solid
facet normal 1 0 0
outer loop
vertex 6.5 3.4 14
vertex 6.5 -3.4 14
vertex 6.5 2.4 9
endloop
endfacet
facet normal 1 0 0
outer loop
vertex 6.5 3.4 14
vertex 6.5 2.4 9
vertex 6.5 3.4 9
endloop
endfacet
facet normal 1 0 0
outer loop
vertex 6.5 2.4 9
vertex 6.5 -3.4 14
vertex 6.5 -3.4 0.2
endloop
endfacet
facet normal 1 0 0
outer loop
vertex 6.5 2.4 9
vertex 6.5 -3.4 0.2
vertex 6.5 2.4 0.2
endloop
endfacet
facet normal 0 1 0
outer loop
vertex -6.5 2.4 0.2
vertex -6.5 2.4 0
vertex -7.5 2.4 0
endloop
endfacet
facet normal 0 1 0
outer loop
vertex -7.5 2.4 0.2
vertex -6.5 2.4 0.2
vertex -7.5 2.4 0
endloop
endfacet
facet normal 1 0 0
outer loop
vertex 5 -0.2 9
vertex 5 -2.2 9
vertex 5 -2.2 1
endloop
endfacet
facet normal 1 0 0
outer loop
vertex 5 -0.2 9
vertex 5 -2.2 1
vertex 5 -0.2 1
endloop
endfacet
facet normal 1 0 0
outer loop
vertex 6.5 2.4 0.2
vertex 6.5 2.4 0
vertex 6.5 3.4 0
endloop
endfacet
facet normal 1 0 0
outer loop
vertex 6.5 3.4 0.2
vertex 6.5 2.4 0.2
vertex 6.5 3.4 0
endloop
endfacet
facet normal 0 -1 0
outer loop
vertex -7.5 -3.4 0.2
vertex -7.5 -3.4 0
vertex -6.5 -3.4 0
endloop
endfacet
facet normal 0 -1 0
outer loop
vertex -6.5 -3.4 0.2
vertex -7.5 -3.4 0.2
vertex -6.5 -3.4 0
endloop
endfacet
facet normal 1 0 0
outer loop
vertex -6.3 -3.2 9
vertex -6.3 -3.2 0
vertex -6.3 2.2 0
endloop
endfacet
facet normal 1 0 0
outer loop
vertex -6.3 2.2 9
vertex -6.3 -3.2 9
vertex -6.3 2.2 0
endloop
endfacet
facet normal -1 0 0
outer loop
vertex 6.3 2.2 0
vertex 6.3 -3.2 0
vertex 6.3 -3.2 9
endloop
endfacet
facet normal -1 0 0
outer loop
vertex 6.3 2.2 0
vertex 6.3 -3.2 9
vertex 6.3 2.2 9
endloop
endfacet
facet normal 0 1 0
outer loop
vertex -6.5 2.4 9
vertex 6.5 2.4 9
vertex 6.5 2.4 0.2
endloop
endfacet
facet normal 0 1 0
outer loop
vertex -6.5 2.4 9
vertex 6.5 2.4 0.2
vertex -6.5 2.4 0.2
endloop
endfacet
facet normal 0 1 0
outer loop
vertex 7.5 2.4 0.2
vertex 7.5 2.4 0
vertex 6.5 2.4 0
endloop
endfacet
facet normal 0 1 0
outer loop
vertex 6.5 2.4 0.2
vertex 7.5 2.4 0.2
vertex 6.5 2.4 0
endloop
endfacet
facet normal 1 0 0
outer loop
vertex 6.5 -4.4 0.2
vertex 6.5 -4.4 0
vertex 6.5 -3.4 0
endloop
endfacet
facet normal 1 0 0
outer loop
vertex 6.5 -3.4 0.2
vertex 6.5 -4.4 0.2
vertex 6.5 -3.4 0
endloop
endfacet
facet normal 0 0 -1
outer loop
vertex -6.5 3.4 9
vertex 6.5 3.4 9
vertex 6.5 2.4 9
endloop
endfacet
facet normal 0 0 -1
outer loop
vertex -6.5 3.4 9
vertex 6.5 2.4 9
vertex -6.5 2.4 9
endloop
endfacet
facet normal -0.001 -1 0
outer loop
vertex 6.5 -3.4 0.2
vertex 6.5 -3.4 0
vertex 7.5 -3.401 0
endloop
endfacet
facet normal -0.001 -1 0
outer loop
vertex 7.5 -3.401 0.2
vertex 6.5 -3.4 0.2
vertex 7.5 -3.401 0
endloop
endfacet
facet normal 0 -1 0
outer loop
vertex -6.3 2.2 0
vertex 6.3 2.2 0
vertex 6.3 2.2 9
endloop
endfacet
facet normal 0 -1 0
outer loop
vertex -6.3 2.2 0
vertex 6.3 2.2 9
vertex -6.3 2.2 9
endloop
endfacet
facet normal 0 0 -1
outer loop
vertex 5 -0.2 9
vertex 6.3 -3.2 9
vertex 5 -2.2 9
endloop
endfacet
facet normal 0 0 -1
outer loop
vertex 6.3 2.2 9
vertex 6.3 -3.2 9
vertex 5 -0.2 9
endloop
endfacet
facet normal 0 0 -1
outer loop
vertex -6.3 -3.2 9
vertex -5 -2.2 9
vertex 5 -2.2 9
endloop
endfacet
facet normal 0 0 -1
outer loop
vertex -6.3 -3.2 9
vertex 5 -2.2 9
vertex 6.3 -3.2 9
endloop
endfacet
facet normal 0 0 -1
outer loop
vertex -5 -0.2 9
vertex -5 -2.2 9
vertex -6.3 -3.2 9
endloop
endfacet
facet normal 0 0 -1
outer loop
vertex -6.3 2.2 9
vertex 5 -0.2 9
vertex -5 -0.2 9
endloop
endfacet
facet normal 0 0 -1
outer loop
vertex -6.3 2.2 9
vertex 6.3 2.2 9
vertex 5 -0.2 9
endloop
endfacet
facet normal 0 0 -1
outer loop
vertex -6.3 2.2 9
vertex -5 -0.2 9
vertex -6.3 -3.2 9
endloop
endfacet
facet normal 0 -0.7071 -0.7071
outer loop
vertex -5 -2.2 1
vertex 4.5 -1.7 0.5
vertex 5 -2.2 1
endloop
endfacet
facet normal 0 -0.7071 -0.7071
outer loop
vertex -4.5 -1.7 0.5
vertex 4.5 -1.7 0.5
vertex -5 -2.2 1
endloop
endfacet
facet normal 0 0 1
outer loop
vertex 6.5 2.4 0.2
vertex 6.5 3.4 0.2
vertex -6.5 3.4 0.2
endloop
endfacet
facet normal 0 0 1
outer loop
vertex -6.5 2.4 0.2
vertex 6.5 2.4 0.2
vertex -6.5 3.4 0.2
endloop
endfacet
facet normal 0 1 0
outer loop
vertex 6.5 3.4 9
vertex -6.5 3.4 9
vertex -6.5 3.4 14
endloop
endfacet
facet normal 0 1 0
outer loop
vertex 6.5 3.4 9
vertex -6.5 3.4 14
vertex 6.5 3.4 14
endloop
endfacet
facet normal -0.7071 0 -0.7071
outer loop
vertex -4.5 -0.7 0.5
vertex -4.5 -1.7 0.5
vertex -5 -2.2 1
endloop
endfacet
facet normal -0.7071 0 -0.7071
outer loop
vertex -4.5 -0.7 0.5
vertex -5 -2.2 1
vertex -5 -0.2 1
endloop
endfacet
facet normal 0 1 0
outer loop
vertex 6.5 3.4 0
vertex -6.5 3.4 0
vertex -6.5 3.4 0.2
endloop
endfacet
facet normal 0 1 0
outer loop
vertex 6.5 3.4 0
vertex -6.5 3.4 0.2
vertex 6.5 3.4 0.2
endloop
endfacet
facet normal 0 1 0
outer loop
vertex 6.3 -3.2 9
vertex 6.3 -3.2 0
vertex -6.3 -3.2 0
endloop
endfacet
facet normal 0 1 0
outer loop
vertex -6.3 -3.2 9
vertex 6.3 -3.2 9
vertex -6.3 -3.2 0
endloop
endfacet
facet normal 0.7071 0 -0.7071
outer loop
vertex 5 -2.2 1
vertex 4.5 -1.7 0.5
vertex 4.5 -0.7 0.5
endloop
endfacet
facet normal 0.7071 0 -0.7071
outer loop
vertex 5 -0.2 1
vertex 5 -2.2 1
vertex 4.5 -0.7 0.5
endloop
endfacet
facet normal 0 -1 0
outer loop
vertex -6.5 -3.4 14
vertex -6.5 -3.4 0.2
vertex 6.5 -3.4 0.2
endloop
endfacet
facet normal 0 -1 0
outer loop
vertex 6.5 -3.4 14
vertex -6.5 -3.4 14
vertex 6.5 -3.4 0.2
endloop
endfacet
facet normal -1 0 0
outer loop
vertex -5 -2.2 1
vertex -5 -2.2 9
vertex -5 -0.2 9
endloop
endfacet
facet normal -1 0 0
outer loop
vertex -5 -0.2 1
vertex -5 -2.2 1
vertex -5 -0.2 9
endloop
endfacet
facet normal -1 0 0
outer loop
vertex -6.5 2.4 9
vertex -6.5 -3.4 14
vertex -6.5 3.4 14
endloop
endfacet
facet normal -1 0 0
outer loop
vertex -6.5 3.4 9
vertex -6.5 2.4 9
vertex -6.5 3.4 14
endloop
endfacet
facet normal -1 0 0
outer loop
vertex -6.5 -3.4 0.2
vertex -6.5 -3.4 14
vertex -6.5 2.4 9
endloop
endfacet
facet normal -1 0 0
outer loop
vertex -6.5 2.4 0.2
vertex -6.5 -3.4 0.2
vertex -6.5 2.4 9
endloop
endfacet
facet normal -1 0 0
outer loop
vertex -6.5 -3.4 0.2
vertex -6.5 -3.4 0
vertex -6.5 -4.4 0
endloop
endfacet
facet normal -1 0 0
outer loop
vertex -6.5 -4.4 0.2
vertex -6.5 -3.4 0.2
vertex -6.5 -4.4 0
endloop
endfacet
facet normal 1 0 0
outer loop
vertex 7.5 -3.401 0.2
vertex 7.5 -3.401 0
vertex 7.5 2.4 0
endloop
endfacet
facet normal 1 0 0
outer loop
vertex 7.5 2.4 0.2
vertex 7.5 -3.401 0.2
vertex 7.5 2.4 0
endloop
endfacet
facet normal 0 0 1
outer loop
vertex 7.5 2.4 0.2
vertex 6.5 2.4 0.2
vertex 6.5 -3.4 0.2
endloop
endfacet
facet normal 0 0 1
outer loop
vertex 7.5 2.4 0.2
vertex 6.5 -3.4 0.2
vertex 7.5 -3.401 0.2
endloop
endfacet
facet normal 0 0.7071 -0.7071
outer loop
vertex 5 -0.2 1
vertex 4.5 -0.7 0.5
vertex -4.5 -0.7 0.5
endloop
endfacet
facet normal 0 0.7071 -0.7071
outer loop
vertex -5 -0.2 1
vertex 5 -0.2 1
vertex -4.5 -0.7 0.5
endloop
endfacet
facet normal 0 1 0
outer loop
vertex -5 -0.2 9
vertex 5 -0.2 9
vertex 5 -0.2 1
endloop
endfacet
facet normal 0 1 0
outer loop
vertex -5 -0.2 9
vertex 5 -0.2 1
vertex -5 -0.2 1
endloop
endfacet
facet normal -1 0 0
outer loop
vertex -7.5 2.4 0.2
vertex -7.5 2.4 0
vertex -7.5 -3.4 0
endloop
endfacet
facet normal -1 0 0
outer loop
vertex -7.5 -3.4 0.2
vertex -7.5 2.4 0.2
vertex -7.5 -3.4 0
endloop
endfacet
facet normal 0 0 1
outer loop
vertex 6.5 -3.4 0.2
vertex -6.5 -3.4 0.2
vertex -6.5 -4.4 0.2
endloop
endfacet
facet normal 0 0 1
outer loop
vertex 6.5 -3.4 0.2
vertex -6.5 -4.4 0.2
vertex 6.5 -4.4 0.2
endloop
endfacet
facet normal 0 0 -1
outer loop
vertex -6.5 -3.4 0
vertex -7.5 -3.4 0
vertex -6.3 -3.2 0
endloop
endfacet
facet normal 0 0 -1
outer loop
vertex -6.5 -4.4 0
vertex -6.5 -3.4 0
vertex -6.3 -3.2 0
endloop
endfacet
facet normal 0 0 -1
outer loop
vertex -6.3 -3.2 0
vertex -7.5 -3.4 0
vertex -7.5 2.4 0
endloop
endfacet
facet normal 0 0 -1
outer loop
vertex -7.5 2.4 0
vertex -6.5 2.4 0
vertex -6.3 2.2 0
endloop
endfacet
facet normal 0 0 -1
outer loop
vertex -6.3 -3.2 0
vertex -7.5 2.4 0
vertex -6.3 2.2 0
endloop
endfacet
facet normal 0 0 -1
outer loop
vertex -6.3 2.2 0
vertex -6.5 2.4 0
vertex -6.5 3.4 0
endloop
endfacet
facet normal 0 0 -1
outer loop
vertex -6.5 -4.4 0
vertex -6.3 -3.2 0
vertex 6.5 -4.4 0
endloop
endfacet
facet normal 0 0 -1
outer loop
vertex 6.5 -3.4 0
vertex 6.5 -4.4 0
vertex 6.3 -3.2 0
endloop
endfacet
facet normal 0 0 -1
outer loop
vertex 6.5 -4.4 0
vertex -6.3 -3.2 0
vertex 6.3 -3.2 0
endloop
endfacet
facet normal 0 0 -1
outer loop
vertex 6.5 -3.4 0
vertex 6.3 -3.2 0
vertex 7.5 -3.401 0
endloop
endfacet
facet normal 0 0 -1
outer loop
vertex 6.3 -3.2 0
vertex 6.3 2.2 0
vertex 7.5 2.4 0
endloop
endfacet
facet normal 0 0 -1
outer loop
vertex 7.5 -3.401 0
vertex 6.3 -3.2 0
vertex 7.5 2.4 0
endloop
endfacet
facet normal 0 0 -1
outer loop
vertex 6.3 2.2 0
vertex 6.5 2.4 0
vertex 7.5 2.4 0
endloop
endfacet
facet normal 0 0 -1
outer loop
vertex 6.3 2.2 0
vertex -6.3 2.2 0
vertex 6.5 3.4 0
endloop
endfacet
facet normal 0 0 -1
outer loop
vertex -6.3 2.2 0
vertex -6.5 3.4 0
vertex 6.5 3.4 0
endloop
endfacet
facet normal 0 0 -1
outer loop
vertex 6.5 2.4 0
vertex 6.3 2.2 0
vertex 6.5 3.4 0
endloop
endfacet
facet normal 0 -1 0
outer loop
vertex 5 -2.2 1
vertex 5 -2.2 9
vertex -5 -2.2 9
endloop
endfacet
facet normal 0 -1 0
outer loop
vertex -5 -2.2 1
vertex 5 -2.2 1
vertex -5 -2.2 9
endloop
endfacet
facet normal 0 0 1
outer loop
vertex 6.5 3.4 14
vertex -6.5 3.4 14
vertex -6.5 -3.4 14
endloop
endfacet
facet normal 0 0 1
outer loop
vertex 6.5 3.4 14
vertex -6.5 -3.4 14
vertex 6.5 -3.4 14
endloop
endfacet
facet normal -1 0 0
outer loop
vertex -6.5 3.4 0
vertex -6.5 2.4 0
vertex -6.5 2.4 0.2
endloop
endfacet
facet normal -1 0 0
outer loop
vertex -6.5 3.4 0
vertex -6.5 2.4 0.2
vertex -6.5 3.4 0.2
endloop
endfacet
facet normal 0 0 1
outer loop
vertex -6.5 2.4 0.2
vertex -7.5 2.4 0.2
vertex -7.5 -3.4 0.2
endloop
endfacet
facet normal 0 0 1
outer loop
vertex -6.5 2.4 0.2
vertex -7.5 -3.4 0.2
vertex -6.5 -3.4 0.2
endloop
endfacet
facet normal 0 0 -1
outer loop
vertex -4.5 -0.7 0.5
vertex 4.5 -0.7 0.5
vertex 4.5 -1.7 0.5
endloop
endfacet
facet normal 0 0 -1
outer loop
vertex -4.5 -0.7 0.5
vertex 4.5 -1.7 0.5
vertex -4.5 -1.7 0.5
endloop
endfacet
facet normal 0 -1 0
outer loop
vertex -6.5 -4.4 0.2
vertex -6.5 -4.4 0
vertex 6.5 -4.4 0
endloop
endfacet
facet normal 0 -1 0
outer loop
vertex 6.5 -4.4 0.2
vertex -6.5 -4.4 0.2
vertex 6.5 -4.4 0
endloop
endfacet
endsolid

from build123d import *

# Parameters (mm, degrees)
SKETCH_1_W          = 13
SKETCH_1_H          = 6.8
EXTRUDE_1_DEPTH     = 14
SKETCH_3_W          = 13
SKETCH_3_H          = 8.8
CUT_EXTRUDE_1_DEPTH = 1
EXTRUDE_2_DEPTH     = 0.2
SKETCH_6_W          = 12.6
SKETCH_6_H          = 5.4
CUT_EXTRUDE_2_DEPTH = 9
SKETCH_7_W          = 10
SKETCH_7_H          = 2
EXTRUDE_3_DEPTH     = 8.5
CHAMFER_1_SIZE      = 0.5


with BuildPart() as part:
    # 草图1 → 拉伸1 (new body)
    with BuildSketch(Plane.XY):
        Rectangle(SKETCH_1_W, SKETCH_1_H)
    extrude(amount=EXTRUDE_1_DEPTH)

    # 草图3 → 切除-拉伸1 (cut)
    with BuildSketch(Plane(origin=(0, 3.4, 0), x_dir=(-1, 0, 0), z_dir=(0, 1, 0))):
        with Locations((0, 4.6)):
            Rectangle(SKETCH_3_W, SKETCH_3_H)
    extrude(amount=-CUT_EXTRUDE_1_DEPTH, mode=Mode.SUBTRACT)

    # 草图4 → 拉伸2 (add)
    with BuildSketch(Plane(origin=(0, 0, 0), x_dir=(-1, 0, 0), z_dir=(0, 0, -1))):
        Polygon((-7.5, 2.4), (7.5, 2.4), (7.5, -3.4), (6.5, -3.4), (6.5, -4.4), (-6.5, -4.4), (-6.5, -3.4), (-7.5, -3.400976197), align=None)
    extrude(amount=-EXTRUDE_2_DEPTH)

    # 草图6 → 切除-拉伸2 (cut)
    with BuildSketch(Plane(origin=(0, 0, 0), x_dir=(-1, 0, 0), z_dir=(0, 0, -1))):
        with Locations((0, -0.5)):
            Rectangle(SKETCH_6_W, SKETCH_6_H)
    extrude(amount=-CUT_EXTRUDE_2_DEPTH, mode=Mode.SUBTRACT)

    # 草图7 → 拉伸3 (add)
    with BuildSketch(Plane(origin=(0, 0, 9), x_dir=(-1, 0, 0), z_dir=(0, 0, -1))):
        with Locations((0, -1.2)):
            Rectangle(SKETCH_7_W, SKETCH_7_H)
    extrude(amount=EXTRUDE_3_DEPTH)

    # 倒角1
    chamfer_1_edges = [part.edges().sort_by_distance(p)[0] for p in [
        (0, -0.2, 0.5),
        (-5, -1.2, 0.5),
        (0, -2.2, 0.5),
        (5, -1.2, 0.5),
    ]]
    chamfer(chamfer_1_edges, length=CHAMFER_1_SIZE)


solid = part.part
